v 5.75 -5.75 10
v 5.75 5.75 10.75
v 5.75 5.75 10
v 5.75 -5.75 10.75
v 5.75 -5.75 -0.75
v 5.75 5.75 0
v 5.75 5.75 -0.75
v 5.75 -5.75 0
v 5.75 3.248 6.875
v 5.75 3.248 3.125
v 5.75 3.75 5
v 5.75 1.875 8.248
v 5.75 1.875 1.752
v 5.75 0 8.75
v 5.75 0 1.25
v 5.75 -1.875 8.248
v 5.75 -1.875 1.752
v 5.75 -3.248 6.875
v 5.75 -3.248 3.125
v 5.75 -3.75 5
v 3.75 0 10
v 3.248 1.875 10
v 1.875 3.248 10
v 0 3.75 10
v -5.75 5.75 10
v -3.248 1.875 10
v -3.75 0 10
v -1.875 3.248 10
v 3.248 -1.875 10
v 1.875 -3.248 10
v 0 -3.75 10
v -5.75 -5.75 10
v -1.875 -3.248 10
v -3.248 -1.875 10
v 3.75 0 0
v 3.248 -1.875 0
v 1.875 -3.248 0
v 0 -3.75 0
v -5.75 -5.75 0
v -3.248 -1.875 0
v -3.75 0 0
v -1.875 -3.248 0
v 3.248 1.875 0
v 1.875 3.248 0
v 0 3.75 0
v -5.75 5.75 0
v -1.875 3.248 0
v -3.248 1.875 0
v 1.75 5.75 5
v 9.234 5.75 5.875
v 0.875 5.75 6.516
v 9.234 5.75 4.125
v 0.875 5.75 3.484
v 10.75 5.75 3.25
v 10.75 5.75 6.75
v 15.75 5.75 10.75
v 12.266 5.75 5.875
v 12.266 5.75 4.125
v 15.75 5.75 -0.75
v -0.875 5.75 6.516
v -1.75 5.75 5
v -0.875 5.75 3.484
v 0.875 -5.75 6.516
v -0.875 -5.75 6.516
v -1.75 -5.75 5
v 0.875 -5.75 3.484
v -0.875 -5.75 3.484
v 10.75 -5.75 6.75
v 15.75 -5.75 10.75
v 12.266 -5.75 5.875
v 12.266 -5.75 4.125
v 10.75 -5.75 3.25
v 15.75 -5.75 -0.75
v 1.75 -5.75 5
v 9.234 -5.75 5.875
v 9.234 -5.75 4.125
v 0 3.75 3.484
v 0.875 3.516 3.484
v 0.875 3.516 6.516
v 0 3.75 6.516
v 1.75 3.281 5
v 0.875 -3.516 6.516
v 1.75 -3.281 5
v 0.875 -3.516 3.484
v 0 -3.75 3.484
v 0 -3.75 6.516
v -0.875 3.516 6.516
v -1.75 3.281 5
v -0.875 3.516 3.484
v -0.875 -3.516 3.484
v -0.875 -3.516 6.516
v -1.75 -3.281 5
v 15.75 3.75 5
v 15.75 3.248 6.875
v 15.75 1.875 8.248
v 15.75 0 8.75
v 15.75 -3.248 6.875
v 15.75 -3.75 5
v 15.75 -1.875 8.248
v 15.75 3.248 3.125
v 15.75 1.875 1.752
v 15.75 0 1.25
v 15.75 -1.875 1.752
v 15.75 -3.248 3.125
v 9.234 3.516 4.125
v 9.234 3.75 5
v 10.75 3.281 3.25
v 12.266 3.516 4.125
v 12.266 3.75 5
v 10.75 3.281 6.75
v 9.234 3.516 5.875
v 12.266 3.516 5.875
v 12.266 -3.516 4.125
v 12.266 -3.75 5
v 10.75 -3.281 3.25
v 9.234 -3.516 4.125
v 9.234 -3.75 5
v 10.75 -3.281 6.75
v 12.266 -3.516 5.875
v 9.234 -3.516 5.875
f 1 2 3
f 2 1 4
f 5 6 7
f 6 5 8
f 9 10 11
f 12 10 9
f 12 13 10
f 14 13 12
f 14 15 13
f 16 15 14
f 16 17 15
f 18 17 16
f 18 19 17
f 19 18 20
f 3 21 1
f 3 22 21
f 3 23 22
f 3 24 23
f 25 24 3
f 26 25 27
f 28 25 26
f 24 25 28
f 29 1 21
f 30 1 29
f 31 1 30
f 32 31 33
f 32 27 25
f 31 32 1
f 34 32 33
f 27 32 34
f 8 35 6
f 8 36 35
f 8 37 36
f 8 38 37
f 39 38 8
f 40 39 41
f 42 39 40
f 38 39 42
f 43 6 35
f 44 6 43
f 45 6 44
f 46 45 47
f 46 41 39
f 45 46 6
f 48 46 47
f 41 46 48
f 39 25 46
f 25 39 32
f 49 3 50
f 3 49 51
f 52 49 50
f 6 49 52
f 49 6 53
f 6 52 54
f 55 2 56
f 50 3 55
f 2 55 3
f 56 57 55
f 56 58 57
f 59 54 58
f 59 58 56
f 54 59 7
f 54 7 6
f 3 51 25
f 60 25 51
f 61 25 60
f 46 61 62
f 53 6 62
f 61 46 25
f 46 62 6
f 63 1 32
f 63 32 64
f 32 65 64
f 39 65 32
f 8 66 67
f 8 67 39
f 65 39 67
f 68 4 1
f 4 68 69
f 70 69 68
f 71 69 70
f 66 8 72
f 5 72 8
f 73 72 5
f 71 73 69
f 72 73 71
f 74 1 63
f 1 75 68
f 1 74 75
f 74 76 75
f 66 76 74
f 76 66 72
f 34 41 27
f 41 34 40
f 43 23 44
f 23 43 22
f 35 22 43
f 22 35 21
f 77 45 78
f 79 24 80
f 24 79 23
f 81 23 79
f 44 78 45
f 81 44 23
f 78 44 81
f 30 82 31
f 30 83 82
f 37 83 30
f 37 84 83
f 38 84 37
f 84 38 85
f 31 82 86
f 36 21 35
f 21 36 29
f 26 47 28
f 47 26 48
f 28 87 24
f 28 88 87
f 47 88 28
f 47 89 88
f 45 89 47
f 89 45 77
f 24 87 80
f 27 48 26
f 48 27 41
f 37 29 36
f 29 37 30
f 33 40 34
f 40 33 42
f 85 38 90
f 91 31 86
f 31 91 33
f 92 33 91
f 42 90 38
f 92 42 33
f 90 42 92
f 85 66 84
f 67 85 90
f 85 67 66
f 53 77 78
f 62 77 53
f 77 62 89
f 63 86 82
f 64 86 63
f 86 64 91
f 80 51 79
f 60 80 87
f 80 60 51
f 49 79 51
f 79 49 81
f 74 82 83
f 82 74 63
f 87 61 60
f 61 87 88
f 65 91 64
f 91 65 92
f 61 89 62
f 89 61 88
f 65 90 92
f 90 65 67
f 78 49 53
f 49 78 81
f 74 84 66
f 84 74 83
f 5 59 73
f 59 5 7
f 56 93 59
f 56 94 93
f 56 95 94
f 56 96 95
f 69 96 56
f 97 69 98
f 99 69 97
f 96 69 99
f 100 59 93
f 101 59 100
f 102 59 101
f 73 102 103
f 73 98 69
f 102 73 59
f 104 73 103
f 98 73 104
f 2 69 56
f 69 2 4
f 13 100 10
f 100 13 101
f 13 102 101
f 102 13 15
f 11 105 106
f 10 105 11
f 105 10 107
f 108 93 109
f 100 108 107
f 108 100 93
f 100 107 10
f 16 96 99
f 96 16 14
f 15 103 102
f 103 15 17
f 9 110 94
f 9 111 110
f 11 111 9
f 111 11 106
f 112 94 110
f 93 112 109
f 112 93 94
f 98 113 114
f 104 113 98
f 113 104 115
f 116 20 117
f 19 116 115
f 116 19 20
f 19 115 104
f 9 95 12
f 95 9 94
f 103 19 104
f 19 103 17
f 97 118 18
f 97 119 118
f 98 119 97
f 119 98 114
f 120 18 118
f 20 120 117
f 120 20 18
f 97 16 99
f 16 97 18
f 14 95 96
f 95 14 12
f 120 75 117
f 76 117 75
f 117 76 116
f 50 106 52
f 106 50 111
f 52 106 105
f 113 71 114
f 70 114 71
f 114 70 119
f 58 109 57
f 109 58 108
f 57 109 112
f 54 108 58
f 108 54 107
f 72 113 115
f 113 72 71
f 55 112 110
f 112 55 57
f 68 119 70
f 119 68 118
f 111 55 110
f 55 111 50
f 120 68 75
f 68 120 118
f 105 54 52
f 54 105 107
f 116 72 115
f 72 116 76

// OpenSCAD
d_od = 7.5000000000;
support_l = 10;
thick = 2;
angle = 90;

union() {
	difference() {
		translate(v = [0, 0, (support_l / 2)]) {
			cube(center = true, size = [(d_od + (2 * thick)), (d_od + (2 * thick)), support_l]);
		}
		translate(v = [0, 0, (-(support_l / 2))]) {
			cylinder(d = d_od, h = (2 * support_l));
		}
		translate(v = [0, 10, 0]) {
			translate(v = [0, 0, (support_l / 2)]) {
				rotate(a = [90, 0, 0]) {
					cylinder(d = 3.5000000000, h = 20);
				}
			}
		}
	}
	translate(v = [0, 0, (support_l / 2)]) {
		translate(v = [((d_od + (2 * thick)) / 2), 0, 0]) {
			rotate(a = [0, angle, 0]) {
				difference() {
					translate(v = [0, 0, (support_l / 2)]) {
						cube(center = true, size = [(d_od + (2 * thick)), (d_od + (2 * thick)), support_l]);
					}
					translate(v = [0, 0, (-(support_l / 2))]) {
						cylinder(d = d_od, h = (2 * support_l));
					}
					translate(v = [0, 10, 0]) {
						translate(v = [0, 0, (support_l / 2)]) {
							rotate(a = [90, 0, 0]) {
								cylinder(d = 3.5000000000, h = 20);
							}
						}
					}
				}
			}
		}
	}
}
